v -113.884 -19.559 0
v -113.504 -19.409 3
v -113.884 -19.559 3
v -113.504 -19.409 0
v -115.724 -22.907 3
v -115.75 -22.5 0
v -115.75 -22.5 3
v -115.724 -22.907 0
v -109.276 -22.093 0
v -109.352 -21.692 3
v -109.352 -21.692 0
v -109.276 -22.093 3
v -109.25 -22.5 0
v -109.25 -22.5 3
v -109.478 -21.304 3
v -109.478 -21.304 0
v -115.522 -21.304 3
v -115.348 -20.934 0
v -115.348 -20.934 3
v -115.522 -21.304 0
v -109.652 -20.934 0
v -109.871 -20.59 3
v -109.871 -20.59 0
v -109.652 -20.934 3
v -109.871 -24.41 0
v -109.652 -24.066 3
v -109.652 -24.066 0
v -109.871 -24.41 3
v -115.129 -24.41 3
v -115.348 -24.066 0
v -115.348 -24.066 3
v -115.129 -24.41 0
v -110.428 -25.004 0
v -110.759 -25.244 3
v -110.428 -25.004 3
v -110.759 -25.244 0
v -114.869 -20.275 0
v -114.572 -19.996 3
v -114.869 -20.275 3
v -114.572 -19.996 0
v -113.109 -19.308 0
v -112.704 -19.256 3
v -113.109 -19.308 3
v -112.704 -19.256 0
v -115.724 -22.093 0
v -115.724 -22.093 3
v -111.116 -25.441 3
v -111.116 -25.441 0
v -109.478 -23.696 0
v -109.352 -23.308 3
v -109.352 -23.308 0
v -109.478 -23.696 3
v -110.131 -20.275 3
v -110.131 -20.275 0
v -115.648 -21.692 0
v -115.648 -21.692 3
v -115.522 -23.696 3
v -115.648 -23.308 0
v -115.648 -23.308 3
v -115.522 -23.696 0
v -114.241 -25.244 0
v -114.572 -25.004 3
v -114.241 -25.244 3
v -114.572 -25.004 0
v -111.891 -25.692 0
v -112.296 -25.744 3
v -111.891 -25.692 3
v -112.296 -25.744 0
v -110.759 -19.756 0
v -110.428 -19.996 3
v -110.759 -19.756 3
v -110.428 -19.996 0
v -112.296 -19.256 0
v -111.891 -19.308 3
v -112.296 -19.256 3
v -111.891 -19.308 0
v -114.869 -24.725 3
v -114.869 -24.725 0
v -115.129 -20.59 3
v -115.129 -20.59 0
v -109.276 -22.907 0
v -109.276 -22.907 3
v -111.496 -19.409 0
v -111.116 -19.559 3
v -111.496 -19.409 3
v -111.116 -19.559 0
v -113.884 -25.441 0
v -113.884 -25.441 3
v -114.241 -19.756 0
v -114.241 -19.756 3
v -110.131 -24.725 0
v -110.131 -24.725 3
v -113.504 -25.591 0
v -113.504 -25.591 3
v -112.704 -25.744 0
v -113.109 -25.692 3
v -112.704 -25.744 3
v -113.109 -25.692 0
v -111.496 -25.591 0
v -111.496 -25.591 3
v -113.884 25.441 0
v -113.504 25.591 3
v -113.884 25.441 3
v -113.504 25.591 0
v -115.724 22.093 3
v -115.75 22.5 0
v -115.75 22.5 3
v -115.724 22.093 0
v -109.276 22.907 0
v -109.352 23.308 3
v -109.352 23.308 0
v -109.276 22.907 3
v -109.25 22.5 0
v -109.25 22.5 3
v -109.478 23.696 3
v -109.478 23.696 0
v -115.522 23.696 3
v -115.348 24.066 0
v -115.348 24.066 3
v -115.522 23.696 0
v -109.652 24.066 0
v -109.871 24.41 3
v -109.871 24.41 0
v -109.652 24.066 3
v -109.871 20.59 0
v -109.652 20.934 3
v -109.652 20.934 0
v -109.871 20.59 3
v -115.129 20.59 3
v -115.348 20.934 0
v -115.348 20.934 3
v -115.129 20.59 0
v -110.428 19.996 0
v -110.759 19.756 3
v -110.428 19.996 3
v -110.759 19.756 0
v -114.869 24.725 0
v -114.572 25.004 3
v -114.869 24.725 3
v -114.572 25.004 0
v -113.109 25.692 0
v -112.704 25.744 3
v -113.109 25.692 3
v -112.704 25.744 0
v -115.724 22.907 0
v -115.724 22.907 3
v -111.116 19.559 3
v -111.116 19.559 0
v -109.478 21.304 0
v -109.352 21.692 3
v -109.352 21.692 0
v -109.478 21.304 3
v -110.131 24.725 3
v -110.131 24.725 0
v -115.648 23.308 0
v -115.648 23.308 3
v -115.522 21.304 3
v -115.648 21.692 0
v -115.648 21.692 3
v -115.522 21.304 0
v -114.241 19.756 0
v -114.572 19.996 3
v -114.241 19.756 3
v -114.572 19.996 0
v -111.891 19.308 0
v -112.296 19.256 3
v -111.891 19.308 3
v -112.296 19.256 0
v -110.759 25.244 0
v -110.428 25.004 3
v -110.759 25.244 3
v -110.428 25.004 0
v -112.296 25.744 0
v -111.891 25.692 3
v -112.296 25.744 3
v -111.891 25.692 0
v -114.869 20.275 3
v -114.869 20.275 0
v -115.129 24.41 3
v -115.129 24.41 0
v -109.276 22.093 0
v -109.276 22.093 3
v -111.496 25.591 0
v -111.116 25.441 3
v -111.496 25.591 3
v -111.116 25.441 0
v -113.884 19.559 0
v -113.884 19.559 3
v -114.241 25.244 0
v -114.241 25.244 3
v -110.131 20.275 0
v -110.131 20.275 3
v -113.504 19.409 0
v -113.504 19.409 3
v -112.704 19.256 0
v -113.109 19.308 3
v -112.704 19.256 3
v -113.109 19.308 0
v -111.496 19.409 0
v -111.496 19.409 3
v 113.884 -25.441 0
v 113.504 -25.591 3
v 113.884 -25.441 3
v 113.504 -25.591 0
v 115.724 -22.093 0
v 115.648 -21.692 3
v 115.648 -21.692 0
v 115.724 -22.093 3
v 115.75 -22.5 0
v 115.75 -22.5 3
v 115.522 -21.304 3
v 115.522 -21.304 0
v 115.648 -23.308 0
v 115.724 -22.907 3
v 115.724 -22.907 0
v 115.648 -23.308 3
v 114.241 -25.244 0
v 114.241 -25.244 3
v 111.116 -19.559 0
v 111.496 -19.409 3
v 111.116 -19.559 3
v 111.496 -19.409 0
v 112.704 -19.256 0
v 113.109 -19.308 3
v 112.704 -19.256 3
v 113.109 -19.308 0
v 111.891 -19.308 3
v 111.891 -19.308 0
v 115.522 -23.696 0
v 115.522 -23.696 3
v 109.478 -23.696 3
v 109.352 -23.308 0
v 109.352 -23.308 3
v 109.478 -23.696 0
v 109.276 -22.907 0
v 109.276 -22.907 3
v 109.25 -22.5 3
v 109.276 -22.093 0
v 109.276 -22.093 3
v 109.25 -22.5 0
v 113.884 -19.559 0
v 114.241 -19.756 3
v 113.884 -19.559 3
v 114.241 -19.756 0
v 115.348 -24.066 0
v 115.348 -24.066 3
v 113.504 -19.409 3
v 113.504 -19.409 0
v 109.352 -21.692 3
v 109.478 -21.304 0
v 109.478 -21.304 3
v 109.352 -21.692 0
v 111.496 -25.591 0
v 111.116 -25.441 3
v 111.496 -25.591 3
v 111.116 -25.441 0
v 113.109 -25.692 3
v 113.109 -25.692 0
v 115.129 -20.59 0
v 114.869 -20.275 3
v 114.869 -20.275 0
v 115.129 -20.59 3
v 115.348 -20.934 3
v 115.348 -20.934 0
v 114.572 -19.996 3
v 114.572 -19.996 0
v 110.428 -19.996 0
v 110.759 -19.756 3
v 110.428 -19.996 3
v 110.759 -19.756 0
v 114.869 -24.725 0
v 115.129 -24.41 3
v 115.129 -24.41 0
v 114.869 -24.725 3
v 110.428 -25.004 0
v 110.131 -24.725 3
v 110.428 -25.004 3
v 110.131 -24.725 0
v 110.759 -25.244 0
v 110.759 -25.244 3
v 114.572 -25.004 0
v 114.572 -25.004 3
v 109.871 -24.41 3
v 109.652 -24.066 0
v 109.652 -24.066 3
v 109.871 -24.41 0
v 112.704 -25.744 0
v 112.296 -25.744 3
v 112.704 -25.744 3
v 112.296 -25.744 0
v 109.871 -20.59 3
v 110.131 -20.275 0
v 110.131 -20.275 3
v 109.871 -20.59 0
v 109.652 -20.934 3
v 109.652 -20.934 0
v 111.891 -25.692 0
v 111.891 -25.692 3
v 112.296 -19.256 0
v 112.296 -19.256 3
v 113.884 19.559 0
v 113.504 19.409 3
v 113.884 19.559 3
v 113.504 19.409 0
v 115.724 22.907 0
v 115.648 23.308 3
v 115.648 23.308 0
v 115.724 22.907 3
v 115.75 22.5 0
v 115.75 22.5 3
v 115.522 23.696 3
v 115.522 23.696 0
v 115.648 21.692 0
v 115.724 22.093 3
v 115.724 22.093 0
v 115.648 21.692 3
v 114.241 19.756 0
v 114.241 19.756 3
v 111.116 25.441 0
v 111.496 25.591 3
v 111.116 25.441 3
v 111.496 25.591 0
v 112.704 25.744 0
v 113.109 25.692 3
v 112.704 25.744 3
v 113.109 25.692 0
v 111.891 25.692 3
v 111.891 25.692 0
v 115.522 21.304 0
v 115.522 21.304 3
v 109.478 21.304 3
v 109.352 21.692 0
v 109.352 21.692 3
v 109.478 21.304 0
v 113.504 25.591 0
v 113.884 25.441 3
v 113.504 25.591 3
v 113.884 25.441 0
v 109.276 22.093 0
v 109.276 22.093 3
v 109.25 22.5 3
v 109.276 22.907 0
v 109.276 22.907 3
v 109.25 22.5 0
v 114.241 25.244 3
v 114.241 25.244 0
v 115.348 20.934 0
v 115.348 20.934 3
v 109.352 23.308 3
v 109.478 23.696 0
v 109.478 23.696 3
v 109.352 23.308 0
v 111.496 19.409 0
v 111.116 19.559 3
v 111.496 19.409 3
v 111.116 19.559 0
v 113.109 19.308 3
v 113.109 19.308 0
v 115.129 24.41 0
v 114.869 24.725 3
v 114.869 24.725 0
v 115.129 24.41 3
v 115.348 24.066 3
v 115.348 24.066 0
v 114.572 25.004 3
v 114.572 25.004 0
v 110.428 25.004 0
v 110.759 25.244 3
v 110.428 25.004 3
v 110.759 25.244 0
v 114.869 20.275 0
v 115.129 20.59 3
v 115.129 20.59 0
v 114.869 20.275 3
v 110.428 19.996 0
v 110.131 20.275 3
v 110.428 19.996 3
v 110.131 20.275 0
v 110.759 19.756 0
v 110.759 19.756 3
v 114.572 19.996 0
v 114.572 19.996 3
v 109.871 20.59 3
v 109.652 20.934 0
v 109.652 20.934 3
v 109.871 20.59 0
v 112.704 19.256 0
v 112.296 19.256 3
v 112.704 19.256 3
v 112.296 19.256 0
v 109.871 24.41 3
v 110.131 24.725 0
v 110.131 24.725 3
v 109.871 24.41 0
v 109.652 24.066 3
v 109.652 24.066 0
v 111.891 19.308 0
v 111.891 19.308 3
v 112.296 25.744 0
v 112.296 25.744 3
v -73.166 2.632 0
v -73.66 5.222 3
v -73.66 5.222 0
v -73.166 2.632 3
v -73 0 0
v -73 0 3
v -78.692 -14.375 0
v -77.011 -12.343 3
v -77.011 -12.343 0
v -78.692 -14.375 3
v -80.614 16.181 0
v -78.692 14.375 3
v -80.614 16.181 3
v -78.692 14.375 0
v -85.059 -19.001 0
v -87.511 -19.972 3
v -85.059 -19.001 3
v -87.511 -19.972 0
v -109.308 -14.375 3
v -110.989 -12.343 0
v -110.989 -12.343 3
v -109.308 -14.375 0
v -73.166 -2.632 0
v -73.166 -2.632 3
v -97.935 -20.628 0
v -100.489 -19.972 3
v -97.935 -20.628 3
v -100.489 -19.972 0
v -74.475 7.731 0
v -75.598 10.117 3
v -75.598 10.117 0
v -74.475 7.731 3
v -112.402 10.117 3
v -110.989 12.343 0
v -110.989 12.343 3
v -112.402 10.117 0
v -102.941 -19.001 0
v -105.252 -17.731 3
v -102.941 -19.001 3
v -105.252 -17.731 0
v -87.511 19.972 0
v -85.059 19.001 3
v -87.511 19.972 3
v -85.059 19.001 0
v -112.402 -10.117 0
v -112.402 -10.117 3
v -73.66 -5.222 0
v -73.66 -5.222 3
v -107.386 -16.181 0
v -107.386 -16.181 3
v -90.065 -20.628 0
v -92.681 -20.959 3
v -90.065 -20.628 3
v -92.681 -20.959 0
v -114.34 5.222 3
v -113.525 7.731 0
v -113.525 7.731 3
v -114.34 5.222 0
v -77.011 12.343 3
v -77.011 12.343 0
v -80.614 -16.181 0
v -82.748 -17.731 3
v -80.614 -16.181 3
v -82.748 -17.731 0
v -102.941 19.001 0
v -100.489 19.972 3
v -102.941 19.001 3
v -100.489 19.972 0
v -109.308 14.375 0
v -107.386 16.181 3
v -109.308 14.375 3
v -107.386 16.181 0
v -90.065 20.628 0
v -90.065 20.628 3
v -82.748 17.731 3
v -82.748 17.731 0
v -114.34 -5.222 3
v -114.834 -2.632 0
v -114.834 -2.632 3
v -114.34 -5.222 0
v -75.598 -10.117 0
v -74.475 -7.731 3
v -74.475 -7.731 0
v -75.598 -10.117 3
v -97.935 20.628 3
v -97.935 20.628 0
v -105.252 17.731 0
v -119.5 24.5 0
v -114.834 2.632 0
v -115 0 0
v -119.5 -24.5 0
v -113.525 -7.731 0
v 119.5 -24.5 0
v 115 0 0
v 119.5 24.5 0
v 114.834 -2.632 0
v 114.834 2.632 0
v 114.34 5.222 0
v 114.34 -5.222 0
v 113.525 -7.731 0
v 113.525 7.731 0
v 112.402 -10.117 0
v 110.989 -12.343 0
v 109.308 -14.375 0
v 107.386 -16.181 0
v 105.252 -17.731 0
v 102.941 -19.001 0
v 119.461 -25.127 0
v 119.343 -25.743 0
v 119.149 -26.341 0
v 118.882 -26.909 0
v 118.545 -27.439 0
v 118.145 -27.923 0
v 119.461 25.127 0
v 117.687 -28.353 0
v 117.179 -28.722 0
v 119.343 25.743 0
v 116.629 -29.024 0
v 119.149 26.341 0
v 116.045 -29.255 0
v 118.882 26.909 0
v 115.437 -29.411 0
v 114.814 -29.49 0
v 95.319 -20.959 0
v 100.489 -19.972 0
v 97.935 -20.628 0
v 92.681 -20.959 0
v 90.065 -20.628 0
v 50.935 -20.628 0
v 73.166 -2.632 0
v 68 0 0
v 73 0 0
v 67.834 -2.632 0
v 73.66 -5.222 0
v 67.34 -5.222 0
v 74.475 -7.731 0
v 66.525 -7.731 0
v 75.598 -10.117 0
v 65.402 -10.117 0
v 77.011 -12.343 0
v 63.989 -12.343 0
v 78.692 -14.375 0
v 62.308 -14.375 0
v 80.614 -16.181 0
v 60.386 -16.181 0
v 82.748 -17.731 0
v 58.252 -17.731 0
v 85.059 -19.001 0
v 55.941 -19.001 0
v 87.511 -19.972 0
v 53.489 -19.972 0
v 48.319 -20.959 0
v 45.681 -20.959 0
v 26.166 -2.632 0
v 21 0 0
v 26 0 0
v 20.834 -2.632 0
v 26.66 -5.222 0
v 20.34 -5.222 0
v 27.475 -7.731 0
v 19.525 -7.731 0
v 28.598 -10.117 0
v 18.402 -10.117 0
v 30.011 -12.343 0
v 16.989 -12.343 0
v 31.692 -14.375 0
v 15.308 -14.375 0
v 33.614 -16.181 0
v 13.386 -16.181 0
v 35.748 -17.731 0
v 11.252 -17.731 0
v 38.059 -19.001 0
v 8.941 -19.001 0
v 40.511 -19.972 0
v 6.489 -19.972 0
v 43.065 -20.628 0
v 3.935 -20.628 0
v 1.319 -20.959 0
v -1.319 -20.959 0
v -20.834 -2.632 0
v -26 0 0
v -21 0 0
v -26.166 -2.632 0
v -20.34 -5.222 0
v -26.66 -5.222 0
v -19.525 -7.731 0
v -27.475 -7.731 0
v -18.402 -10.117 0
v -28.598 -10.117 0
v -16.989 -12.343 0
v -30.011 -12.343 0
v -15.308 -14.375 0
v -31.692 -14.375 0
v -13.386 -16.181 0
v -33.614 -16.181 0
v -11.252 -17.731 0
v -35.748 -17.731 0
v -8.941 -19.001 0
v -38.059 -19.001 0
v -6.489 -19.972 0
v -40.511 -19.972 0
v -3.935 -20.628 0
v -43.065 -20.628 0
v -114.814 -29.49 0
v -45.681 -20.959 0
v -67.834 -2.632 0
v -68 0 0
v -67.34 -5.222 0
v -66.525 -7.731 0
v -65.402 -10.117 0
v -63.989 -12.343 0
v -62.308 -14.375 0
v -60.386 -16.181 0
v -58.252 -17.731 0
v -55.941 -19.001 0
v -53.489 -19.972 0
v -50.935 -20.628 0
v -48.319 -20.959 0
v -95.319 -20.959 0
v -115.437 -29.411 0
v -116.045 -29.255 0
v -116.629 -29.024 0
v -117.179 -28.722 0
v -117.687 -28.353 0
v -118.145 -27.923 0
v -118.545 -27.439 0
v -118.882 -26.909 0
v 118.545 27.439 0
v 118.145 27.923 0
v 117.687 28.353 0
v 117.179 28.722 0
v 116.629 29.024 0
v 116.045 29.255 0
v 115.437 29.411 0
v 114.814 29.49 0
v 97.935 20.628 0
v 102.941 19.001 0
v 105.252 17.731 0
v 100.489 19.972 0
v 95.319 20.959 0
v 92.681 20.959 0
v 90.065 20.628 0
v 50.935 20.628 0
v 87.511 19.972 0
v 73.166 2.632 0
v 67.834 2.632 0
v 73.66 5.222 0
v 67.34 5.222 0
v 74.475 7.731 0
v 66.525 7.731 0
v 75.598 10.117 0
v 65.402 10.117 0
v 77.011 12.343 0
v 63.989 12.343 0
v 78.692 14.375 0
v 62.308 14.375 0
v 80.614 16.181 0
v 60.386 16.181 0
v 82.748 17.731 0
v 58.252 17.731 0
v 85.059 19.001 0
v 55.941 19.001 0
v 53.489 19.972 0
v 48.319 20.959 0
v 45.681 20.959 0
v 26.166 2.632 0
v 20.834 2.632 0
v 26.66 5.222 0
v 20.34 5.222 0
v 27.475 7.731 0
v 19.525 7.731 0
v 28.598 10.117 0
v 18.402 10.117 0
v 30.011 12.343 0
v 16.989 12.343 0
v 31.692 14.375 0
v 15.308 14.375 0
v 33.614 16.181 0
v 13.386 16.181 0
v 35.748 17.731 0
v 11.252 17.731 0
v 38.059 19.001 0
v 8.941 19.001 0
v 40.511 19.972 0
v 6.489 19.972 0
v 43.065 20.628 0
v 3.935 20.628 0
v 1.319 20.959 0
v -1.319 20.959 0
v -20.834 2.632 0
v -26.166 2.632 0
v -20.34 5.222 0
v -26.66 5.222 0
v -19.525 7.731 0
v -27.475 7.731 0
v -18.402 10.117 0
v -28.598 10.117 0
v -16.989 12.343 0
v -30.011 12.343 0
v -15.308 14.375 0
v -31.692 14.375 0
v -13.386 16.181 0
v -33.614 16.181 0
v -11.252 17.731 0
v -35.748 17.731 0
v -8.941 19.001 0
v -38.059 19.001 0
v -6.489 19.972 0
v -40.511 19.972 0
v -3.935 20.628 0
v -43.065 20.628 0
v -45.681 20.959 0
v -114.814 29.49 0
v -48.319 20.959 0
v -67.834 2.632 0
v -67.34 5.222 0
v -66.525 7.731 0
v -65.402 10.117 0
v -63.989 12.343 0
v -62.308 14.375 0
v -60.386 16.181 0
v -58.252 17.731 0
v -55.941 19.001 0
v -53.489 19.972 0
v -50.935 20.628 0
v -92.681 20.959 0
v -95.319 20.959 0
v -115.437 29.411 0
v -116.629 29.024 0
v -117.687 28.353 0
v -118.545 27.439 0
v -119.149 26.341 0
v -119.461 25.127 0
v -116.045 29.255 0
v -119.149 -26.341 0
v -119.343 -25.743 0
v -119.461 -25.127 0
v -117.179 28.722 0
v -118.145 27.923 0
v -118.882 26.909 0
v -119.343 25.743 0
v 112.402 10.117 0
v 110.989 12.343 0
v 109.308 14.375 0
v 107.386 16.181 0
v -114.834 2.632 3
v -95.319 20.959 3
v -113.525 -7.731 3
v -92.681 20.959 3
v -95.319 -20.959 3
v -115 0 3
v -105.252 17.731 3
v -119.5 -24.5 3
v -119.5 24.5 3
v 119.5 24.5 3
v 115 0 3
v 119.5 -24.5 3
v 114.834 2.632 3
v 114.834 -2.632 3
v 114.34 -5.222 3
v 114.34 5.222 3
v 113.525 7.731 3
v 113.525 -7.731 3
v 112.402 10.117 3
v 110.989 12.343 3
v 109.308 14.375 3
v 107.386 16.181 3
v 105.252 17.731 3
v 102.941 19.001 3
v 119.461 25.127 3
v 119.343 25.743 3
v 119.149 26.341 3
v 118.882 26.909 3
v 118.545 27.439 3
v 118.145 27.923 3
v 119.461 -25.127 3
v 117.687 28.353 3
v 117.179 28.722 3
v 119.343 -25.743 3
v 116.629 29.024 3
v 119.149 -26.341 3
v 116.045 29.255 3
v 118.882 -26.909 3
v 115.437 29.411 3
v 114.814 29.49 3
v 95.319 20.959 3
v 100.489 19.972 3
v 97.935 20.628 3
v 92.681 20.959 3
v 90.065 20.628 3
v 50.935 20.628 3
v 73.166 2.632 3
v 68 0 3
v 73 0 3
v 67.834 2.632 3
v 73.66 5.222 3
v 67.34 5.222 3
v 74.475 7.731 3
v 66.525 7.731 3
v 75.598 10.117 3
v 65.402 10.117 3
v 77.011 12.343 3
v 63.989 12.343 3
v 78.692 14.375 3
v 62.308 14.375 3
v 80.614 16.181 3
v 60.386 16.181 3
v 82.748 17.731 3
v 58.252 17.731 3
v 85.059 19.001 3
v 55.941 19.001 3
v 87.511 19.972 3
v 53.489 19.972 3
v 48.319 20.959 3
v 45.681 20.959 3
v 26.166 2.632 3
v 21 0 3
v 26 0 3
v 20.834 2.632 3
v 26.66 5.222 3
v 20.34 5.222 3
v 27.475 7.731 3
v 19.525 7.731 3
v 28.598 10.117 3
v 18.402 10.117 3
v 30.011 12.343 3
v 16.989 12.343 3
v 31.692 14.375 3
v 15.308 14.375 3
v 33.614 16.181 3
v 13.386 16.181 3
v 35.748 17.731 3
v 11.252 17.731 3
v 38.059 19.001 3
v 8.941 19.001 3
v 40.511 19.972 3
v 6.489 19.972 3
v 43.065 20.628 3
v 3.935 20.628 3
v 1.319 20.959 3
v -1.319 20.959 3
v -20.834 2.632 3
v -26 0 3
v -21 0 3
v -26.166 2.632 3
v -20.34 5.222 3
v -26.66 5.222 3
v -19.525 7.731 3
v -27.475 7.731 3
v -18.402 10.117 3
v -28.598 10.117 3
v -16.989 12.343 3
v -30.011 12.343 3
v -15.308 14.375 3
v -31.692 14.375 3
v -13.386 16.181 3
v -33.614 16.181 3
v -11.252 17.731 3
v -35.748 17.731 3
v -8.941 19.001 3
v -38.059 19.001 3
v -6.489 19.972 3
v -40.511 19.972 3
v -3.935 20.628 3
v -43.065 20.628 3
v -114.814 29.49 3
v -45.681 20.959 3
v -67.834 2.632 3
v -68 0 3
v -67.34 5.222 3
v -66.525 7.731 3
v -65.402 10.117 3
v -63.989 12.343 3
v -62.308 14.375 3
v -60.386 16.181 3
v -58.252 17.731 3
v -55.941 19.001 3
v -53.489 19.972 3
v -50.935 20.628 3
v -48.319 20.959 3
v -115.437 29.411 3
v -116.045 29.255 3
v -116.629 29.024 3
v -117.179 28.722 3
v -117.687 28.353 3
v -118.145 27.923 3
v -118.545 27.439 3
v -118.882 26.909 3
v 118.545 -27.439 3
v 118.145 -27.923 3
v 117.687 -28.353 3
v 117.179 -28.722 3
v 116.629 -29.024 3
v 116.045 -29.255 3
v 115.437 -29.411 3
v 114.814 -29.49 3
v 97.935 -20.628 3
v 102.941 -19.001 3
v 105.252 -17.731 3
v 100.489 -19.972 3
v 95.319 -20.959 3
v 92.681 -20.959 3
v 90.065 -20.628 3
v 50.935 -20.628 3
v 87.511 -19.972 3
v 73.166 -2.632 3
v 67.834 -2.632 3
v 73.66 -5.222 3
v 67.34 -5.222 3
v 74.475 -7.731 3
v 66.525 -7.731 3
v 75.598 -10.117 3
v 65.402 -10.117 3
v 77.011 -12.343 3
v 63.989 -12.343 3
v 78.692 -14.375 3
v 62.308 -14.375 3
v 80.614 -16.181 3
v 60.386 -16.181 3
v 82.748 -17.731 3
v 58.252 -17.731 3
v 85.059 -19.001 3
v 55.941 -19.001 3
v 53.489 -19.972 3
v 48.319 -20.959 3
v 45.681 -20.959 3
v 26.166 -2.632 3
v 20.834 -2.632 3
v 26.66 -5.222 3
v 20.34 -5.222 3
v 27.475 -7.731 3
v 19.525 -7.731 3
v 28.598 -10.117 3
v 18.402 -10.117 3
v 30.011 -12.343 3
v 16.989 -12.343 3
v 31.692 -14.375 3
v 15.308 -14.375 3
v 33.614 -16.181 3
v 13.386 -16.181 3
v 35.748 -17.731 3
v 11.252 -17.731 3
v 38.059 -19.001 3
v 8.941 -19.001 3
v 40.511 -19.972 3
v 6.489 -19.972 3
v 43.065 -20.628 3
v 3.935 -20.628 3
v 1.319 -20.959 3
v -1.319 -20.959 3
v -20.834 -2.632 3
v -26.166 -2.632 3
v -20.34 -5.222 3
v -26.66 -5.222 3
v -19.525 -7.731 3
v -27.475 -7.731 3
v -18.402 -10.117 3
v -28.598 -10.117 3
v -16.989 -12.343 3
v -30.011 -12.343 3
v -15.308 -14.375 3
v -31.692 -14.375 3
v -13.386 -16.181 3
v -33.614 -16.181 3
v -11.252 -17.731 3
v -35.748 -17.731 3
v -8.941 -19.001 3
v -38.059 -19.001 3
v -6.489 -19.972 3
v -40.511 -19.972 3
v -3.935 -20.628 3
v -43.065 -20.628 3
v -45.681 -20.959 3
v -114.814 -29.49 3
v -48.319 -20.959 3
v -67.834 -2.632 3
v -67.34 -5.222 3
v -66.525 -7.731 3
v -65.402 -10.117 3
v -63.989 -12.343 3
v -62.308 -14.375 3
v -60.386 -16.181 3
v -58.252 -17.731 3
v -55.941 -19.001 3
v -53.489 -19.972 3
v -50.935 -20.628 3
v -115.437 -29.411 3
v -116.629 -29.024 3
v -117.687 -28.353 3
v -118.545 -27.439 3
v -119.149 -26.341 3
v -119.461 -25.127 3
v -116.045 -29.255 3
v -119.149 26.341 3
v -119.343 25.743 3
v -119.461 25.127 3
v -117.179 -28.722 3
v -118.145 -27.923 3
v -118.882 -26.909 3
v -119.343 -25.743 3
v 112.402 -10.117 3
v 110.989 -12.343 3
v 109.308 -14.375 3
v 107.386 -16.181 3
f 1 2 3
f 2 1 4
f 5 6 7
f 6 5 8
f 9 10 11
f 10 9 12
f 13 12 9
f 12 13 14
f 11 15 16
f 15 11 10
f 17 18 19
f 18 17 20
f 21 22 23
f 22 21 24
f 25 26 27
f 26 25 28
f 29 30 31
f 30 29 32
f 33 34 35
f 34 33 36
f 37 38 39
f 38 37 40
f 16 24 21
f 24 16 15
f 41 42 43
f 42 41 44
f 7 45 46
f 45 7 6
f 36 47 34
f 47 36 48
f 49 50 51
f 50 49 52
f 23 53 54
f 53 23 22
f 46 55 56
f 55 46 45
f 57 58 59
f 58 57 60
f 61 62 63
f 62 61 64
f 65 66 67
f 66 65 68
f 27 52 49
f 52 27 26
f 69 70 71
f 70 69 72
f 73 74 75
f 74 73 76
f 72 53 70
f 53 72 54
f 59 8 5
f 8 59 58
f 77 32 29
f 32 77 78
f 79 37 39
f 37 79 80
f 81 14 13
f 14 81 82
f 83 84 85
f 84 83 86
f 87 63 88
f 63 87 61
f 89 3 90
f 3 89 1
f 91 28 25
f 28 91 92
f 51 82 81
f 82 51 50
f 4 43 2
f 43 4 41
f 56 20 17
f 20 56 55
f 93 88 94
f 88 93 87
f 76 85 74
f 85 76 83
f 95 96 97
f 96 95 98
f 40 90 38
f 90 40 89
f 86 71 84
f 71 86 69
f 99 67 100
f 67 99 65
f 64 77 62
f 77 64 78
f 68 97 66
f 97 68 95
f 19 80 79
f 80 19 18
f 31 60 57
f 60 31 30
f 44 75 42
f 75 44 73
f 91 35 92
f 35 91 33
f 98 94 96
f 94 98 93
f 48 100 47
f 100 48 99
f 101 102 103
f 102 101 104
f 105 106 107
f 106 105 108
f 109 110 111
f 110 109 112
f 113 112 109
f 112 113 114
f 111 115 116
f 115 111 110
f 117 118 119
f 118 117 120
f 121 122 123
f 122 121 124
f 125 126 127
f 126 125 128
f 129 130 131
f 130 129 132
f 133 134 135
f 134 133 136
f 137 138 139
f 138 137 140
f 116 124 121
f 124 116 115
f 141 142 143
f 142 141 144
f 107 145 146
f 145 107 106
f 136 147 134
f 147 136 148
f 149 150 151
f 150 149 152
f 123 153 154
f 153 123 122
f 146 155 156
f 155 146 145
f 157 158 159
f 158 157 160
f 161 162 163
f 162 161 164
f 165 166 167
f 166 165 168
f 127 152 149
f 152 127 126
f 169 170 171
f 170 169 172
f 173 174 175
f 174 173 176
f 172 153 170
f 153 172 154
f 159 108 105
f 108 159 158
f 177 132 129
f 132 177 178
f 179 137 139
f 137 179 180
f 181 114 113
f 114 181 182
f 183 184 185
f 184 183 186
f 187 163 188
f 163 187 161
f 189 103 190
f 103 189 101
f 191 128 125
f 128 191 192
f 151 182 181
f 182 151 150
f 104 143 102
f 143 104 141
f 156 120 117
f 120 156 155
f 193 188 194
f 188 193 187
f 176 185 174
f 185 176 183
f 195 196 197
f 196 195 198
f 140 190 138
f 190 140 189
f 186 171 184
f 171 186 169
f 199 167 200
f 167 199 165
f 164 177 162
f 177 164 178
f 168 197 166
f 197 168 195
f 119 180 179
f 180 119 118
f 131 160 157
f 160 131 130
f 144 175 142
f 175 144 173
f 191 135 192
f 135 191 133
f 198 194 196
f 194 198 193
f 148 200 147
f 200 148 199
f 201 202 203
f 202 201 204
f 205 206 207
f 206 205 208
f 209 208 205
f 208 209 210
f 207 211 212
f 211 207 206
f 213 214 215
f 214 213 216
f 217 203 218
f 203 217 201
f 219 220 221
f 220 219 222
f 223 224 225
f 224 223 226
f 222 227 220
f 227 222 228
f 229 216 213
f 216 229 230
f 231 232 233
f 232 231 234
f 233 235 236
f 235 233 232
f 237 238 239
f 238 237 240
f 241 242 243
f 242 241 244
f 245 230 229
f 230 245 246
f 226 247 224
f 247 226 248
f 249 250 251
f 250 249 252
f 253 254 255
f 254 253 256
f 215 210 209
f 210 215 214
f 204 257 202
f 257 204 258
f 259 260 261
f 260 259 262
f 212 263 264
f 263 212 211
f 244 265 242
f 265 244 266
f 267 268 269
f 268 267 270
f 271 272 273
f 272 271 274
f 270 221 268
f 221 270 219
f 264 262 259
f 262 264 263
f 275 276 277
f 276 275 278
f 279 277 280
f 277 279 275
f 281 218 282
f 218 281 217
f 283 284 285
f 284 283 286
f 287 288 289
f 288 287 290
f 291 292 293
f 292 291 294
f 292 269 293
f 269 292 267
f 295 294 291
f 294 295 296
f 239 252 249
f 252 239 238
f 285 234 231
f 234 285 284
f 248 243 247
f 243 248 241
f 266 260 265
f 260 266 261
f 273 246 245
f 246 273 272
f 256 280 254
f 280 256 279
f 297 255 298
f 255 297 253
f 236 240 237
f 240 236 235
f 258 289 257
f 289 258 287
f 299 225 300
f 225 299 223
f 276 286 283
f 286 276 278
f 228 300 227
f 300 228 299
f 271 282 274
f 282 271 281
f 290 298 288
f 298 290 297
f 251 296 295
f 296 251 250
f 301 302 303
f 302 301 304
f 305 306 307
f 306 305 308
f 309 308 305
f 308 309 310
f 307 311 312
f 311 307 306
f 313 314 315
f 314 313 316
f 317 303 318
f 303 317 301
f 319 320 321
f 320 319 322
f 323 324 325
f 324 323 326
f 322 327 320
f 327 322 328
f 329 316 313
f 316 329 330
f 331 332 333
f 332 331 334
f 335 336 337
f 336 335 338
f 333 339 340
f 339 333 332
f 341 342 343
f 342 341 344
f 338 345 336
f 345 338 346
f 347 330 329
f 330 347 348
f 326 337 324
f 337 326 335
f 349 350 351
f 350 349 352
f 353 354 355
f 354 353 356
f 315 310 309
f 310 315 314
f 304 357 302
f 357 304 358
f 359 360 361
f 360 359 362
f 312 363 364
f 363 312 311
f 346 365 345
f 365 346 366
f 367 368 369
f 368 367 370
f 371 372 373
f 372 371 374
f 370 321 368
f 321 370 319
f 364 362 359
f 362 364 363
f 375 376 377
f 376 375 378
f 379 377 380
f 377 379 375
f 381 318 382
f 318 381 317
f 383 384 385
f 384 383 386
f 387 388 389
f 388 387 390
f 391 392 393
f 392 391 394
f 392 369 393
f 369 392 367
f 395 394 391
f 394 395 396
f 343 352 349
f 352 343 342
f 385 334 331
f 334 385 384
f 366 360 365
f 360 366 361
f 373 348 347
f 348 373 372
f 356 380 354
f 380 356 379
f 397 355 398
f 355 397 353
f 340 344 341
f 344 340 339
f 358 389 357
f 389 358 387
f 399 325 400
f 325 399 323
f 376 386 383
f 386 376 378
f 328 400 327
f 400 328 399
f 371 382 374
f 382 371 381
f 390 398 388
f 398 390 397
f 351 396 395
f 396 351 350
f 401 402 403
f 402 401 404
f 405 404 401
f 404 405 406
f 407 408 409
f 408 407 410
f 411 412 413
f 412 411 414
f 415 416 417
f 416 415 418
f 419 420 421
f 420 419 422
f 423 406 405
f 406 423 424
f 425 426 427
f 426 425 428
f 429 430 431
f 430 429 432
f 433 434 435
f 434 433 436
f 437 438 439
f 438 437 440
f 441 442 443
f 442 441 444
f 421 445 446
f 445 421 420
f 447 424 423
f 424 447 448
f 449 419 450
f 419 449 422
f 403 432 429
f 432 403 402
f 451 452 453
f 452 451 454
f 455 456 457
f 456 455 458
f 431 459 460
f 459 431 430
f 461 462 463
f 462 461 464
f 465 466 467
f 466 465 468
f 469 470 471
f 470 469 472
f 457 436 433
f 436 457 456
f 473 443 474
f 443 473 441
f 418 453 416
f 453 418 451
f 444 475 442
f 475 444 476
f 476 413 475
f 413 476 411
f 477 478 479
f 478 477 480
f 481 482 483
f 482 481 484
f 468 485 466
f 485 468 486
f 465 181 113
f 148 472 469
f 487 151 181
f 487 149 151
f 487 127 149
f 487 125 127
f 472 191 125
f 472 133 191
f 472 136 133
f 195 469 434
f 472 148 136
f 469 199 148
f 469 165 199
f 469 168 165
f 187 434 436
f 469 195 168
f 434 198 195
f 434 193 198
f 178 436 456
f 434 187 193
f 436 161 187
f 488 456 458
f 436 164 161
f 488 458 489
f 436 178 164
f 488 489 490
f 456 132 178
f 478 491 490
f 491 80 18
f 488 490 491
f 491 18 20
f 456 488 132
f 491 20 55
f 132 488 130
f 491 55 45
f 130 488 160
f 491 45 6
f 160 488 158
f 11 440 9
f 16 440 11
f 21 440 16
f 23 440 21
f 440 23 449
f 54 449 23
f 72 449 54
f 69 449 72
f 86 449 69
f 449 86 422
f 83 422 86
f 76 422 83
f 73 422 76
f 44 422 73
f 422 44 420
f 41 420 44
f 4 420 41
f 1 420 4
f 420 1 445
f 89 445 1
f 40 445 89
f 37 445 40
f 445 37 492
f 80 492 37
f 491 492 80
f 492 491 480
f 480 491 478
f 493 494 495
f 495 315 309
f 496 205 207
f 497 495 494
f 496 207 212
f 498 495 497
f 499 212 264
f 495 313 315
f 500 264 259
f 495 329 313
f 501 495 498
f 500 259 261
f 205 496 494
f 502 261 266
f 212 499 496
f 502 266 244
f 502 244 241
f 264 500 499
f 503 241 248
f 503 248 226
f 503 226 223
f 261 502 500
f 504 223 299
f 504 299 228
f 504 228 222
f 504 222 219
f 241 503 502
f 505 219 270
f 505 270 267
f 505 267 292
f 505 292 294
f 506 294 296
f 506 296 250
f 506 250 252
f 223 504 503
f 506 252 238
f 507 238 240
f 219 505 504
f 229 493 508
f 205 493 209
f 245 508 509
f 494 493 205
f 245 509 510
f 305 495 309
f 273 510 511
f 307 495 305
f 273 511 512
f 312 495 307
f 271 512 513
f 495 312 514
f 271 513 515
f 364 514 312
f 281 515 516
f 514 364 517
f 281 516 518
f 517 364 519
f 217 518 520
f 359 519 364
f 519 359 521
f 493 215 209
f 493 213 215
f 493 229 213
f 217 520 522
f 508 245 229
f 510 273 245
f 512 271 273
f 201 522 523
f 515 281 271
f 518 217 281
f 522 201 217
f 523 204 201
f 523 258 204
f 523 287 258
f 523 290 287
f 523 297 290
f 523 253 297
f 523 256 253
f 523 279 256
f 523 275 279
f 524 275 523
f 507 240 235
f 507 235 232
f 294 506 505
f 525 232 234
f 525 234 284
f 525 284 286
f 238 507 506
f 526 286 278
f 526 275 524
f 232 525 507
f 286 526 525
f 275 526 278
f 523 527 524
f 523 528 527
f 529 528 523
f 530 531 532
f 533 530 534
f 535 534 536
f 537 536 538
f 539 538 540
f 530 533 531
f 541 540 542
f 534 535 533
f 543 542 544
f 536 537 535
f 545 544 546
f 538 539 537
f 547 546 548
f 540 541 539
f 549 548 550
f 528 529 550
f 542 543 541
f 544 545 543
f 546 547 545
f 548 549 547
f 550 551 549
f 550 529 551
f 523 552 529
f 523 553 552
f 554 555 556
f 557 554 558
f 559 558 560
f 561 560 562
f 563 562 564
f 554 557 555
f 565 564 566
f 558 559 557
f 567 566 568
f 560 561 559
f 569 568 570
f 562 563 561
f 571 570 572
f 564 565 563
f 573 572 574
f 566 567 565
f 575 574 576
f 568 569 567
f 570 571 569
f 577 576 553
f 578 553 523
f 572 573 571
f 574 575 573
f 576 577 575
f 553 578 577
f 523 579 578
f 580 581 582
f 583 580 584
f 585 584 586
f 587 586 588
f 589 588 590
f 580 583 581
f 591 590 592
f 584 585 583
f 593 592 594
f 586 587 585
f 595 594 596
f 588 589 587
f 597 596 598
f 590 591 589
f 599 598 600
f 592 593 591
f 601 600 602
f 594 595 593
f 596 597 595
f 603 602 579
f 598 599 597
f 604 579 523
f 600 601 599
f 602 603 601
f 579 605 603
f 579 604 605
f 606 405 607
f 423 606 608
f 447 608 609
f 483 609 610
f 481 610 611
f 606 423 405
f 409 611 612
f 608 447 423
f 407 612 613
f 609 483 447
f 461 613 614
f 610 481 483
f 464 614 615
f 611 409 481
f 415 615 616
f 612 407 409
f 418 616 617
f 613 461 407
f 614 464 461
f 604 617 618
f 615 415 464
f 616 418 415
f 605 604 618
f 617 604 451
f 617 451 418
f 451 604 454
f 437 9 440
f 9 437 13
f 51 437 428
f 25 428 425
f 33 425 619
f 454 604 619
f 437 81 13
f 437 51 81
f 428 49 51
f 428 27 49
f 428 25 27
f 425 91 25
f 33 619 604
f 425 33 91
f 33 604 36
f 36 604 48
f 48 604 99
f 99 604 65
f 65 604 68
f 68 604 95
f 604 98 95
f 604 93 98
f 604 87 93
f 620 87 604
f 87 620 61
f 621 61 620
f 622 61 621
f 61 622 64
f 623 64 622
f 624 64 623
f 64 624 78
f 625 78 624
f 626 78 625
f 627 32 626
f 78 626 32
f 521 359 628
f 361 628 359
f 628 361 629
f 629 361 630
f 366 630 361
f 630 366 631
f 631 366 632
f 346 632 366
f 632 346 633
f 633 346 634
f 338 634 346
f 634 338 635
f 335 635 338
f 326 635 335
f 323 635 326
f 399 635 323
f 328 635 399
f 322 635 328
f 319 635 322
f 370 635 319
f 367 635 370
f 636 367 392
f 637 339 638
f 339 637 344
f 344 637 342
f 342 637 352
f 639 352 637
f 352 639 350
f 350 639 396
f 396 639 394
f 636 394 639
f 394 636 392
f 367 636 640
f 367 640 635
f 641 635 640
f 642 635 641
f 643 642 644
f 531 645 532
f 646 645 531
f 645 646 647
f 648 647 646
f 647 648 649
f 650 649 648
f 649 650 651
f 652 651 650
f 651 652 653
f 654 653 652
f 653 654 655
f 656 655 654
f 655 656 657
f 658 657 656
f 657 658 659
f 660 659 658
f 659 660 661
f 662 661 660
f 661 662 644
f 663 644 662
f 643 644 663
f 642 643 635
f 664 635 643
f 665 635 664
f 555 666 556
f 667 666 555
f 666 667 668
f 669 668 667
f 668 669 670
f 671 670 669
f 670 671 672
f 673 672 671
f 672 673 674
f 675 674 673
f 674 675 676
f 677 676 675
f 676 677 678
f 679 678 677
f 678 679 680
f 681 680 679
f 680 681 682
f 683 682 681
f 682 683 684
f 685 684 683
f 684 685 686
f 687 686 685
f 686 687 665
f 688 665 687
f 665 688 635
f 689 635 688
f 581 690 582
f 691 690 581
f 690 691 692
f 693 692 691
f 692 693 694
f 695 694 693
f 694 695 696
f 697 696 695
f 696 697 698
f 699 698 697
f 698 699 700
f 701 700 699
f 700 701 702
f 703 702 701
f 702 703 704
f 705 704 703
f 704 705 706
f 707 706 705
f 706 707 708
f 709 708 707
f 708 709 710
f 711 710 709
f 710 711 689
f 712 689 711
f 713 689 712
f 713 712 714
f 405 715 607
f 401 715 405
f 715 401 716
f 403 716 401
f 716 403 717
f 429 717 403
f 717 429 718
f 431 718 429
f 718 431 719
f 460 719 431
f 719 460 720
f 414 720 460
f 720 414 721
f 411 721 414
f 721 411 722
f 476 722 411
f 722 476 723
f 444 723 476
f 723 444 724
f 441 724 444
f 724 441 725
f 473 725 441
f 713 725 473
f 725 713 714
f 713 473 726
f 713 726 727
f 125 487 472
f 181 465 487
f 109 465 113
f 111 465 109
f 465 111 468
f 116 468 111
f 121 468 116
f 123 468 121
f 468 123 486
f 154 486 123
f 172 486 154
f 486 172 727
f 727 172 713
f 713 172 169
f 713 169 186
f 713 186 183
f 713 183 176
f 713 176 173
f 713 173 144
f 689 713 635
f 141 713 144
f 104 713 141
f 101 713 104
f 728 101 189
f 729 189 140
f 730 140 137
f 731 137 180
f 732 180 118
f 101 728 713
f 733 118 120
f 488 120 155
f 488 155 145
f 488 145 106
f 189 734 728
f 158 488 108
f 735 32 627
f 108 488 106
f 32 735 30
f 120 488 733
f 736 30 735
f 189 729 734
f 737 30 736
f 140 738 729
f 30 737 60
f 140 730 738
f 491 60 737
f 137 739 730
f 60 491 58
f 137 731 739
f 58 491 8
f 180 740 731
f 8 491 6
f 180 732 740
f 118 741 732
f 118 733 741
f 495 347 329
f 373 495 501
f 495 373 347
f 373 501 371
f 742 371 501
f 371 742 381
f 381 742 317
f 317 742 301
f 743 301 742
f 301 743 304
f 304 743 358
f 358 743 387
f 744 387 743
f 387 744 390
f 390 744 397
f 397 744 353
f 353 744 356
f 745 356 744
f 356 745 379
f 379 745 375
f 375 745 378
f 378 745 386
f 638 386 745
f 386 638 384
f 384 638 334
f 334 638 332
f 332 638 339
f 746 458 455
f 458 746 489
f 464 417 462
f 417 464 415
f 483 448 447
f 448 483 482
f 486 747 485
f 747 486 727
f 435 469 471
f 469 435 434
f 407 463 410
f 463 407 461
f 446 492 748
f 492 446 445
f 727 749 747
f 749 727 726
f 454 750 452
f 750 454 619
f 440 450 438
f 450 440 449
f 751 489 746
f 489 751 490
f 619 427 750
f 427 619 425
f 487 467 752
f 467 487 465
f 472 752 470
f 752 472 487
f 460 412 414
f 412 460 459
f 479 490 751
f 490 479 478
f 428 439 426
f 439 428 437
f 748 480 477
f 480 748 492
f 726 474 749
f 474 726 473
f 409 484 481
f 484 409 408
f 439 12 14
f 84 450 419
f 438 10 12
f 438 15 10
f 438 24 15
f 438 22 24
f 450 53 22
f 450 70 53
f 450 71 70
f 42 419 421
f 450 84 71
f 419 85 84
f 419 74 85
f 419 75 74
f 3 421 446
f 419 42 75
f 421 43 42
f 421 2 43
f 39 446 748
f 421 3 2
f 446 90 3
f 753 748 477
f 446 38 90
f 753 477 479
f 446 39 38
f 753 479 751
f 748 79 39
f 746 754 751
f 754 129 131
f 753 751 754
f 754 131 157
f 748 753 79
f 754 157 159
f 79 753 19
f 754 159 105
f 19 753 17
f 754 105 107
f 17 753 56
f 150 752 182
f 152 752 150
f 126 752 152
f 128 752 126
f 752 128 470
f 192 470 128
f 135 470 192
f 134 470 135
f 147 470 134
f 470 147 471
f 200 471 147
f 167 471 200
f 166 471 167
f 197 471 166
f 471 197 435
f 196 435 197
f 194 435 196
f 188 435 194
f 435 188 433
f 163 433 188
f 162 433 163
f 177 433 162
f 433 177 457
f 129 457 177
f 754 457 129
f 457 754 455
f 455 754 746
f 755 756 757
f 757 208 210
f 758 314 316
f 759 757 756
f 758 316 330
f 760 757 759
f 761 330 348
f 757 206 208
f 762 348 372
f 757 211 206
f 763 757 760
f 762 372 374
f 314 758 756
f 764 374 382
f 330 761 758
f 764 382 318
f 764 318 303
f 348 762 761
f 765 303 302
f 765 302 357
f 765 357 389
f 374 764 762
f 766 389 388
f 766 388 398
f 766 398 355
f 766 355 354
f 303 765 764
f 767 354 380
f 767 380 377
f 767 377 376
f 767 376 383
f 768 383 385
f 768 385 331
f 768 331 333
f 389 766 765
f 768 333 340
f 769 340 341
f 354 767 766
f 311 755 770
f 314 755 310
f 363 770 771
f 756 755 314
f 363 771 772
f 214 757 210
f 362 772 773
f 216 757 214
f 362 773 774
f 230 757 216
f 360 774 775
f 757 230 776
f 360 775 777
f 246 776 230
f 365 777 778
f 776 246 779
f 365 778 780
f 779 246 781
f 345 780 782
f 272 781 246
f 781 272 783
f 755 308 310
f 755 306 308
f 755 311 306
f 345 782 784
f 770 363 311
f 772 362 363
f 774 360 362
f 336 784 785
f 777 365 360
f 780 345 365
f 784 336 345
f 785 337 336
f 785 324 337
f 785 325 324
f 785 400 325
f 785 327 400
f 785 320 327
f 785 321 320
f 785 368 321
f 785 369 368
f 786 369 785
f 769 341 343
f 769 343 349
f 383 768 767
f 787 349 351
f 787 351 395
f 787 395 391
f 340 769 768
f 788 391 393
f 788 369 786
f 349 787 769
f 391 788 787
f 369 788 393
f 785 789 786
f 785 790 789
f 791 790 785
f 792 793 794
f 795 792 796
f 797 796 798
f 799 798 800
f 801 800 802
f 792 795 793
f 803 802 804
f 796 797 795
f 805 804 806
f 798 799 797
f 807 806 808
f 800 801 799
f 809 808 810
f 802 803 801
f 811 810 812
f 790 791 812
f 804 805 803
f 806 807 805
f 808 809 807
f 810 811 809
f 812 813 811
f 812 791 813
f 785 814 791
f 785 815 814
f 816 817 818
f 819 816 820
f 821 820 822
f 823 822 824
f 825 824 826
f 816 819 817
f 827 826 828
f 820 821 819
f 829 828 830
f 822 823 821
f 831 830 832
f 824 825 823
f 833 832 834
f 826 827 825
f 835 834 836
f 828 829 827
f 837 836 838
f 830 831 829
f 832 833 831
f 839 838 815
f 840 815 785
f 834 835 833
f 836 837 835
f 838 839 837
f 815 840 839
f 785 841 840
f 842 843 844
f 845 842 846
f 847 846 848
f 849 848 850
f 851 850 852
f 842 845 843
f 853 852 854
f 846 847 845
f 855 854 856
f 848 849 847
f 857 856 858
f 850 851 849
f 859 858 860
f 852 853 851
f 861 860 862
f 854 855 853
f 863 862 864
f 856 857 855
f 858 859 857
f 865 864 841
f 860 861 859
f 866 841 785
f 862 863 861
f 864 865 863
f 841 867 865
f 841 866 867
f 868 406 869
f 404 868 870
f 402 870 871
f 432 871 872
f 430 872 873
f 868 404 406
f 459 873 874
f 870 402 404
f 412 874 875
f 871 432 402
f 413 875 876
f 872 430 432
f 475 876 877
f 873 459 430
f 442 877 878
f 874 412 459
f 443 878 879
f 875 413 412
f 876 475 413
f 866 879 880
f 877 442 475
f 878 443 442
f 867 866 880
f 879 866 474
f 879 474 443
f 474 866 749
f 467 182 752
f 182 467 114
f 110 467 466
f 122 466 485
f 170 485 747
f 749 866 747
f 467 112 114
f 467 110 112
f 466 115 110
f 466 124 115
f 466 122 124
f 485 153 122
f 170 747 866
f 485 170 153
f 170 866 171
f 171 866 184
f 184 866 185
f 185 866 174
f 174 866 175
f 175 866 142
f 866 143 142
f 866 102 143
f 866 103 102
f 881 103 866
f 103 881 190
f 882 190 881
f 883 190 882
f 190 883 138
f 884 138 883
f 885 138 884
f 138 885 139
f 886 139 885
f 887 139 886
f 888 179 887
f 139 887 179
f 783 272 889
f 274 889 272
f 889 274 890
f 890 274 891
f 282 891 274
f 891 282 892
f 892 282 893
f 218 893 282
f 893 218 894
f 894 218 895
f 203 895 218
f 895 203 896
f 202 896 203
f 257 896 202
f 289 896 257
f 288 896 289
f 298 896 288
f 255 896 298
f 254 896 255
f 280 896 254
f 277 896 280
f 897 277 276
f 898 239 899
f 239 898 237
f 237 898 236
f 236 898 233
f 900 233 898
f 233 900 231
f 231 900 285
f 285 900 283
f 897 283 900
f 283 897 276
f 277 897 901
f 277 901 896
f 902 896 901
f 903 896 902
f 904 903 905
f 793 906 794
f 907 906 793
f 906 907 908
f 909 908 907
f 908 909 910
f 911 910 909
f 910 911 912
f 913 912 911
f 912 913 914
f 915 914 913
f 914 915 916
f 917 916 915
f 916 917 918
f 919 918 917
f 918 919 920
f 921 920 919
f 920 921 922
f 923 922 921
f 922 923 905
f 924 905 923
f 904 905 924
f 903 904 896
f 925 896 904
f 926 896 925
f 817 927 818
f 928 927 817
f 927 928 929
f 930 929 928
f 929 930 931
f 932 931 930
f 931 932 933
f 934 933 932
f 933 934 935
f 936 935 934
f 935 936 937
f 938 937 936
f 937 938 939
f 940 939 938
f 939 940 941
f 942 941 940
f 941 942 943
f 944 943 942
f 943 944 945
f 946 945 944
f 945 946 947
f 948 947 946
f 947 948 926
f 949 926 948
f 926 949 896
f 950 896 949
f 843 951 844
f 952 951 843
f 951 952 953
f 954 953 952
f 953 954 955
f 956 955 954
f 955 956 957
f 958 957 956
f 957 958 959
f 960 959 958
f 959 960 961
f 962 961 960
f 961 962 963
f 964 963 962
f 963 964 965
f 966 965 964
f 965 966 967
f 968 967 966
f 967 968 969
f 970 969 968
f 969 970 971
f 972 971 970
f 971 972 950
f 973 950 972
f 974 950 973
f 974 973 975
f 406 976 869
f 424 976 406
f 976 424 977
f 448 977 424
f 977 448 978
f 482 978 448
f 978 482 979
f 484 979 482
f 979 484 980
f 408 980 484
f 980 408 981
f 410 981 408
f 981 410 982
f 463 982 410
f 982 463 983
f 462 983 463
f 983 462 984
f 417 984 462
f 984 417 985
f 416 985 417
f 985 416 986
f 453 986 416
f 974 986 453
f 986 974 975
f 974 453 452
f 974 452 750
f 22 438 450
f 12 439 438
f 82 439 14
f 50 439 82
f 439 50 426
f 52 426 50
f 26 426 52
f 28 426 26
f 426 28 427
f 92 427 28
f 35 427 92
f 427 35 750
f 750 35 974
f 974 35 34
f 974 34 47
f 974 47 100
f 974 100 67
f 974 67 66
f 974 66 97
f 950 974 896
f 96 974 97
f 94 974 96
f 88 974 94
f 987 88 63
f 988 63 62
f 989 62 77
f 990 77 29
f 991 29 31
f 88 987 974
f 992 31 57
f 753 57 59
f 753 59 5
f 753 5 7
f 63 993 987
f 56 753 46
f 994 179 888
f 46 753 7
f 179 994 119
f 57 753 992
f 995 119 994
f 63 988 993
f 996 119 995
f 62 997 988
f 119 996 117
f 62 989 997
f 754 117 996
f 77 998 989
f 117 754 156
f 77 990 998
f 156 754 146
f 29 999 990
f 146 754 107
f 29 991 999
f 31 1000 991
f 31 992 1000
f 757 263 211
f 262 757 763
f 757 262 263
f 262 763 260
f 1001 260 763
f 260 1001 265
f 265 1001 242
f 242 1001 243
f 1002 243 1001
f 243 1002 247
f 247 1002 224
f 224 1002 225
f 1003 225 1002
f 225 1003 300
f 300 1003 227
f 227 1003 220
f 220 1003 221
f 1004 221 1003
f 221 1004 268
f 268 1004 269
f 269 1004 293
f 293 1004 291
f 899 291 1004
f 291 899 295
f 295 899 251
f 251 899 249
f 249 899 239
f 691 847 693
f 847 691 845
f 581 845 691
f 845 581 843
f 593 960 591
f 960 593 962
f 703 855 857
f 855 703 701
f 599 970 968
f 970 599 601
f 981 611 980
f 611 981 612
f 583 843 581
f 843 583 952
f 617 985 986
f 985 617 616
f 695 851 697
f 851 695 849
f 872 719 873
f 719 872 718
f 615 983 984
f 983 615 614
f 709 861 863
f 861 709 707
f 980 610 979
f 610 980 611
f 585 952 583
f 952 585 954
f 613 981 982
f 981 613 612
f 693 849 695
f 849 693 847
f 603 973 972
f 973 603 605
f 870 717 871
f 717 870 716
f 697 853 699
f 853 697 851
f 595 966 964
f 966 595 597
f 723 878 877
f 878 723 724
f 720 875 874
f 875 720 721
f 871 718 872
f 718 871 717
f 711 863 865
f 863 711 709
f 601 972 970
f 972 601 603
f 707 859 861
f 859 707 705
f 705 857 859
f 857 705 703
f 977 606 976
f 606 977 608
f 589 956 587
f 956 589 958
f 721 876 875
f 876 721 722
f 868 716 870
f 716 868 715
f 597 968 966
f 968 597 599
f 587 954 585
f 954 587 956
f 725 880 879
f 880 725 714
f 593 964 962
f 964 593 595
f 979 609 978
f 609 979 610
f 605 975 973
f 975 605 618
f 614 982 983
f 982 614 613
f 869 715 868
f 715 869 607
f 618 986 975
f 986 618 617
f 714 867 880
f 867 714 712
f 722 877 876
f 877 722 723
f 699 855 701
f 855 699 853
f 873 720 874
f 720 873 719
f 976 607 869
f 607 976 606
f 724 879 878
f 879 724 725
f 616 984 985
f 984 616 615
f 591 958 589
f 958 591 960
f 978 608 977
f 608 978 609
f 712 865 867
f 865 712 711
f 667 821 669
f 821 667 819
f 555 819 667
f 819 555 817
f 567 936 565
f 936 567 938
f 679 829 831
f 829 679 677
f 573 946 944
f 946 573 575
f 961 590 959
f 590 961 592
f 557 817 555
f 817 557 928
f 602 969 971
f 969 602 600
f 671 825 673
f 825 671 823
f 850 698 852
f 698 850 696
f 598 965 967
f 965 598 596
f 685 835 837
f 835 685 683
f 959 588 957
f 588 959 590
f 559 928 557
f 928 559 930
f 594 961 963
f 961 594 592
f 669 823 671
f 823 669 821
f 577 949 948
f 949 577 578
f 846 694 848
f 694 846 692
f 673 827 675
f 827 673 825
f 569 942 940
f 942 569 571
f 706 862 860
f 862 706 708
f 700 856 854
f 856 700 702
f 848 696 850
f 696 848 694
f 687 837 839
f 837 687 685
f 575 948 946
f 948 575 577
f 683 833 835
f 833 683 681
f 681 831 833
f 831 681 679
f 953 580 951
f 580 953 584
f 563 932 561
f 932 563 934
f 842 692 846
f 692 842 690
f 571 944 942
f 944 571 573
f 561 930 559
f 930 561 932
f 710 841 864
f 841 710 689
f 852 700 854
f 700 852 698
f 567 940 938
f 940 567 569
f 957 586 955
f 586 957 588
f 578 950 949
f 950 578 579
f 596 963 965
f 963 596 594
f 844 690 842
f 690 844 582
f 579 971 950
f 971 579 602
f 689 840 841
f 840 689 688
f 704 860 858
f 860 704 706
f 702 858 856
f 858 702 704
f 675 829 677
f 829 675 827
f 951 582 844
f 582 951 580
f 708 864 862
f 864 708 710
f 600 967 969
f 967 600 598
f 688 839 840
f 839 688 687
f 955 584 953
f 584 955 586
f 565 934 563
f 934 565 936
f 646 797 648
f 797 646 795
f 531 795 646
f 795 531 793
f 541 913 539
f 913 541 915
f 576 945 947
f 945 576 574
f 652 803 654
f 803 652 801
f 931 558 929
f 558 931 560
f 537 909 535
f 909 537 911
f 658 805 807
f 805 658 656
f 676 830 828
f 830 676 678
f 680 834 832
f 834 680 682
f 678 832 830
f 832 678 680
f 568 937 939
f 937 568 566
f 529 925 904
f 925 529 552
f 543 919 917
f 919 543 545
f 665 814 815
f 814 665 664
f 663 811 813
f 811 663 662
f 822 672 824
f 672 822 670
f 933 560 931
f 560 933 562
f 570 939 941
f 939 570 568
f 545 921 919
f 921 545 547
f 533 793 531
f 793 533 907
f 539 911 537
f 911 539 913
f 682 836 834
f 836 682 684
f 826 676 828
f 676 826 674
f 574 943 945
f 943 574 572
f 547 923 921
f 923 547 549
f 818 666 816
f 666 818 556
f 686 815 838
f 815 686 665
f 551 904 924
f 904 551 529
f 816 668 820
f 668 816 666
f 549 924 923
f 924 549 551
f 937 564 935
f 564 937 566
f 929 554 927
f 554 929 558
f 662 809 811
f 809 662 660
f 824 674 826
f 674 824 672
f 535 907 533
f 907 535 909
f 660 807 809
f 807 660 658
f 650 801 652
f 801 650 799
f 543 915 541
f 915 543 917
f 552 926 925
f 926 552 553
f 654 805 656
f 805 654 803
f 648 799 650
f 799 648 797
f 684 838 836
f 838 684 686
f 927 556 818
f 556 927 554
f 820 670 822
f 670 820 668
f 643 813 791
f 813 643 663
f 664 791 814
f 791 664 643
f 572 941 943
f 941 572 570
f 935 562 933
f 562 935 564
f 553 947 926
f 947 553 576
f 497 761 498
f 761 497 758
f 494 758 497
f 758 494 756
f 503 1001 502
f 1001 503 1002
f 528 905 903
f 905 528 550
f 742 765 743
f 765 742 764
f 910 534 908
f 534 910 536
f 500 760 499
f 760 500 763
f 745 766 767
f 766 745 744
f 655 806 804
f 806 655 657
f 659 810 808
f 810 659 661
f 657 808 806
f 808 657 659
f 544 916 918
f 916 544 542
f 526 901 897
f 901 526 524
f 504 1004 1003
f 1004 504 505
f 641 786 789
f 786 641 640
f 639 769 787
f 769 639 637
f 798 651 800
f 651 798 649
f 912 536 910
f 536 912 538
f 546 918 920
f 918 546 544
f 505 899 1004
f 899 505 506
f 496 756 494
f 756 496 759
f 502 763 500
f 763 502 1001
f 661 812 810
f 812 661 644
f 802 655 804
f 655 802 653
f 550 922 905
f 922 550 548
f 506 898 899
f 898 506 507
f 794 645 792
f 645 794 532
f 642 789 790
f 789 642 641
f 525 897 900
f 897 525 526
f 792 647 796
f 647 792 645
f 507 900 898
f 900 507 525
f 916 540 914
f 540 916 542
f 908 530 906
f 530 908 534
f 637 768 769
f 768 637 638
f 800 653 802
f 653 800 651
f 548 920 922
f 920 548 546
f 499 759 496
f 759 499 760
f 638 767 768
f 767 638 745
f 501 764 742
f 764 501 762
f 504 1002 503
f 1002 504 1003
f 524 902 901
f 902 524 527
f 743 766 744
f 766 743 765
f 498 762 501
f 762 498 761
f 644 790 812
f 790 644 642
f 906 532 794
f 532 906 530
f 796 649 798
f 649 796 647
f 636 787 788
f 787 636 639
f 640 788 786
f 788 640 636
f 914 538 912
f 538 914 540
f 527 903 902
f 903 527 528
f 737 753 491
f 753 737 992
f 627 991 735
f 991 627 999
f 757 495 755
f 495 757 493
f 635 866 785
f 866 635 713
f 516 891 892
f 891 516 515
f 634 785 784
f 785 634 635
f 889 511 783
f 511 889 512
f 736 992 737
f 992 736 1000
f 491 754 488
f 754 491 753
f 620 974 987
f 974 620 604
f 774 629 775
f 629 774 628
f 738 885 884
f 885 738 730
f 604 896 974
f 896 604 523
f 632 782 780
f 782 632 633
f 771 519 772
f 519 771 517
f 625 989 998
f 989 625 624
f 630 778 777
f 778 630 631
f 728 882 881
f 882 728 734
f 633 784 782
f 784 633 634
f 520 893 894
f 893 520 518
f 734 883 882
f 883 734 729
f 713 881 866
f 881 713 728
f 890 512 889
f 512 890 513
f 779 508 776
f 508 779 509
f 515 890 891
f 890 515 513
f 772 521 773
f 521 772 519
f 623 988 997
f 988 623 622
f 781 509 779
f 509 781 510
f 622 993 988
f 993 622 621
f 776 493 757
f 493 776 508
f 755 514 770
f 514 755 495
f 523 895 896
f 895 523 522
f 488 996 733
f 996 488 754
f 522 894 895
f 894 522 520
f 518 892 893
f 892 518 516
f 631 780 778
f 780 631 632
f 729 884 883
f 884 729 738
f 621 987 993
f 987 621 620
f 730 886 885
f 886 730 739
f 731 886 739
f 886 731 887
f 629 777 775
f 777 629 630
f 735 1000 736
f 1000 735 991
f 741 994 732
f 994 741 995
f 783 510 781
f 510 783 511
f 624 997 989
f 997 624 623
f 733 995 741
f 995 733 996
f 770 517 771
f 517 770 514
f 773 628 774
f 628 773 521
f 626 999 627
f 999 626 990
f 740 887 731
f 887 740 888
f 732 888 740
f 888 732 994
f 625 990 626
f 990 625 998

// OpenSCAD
$fn = 50;

difference() {
	union() {
		hull() {
			translate(v = [-114.5, 24.5, 0]) {
				cylinder(h = 3, r = 5);
			}
			translate(v = [114.5, 24.5, 0]) {
				cylinder(h = 3, r = 5);
			}
			translate(v = [-114.5, -24.5, 0]) {
				cylinder(h = 3, r = 5);
			}
			translate(v = [114.5, -24.5, 0]) {
				cylinder(h = 3, r = 5);
			}
		}
	}
	union() {
		translate(v = [-112.5, -22.5, -100.0]) {
			cylinder(h = 200, r = 3.25);
		}
		translate(v = [-112.5, 22.5, -100.0]) {
			cylinder(h = 200, r = 3.25);
		}
		translate(v = [112.5, -22.5, -100.0]) {
			cylinder(h = 200, r = 3.25);
		}
		translate(v = [112.5, 22.5, -100.0]) {
			cylinder(h = 200, r = 3.25);
		}
		translate(v = [-112.5, -22.5, -100.0]) {
			cylinder(h = 200, r = 1.8);
		}
		translate(v = [-112.5, 22.5, -100.0]) {
			cylinder(h = 200, r = 1.8);
		}
		translate(v = [112.5, -22.5, -100.0]) {
			cylinder(h = 200, r = 1.8);
		}
		translate(v = [112.5, 22.5, -100.0]) {
			cylinder(h = 200, r = 1.8);
		}
		translate(v = [-94.0, 0, 0.0]) {
			cylinder(h = 3, r = 21.0);
		}
		translate(v = [-47.0, 0, 0.0]) {
			cylinder(h = 3, r = 21.0);
		}
		cylinder(h = 3, r = 21.0);
		translate(v = [47.0, 0, 0.0]) {
			cylinder(h = 3, r = 21.0);
		}
		translate(v = [94.0, 0, 0.0]) {
			cylinder(h = 3, r = 21.0);
		}
	}
}
